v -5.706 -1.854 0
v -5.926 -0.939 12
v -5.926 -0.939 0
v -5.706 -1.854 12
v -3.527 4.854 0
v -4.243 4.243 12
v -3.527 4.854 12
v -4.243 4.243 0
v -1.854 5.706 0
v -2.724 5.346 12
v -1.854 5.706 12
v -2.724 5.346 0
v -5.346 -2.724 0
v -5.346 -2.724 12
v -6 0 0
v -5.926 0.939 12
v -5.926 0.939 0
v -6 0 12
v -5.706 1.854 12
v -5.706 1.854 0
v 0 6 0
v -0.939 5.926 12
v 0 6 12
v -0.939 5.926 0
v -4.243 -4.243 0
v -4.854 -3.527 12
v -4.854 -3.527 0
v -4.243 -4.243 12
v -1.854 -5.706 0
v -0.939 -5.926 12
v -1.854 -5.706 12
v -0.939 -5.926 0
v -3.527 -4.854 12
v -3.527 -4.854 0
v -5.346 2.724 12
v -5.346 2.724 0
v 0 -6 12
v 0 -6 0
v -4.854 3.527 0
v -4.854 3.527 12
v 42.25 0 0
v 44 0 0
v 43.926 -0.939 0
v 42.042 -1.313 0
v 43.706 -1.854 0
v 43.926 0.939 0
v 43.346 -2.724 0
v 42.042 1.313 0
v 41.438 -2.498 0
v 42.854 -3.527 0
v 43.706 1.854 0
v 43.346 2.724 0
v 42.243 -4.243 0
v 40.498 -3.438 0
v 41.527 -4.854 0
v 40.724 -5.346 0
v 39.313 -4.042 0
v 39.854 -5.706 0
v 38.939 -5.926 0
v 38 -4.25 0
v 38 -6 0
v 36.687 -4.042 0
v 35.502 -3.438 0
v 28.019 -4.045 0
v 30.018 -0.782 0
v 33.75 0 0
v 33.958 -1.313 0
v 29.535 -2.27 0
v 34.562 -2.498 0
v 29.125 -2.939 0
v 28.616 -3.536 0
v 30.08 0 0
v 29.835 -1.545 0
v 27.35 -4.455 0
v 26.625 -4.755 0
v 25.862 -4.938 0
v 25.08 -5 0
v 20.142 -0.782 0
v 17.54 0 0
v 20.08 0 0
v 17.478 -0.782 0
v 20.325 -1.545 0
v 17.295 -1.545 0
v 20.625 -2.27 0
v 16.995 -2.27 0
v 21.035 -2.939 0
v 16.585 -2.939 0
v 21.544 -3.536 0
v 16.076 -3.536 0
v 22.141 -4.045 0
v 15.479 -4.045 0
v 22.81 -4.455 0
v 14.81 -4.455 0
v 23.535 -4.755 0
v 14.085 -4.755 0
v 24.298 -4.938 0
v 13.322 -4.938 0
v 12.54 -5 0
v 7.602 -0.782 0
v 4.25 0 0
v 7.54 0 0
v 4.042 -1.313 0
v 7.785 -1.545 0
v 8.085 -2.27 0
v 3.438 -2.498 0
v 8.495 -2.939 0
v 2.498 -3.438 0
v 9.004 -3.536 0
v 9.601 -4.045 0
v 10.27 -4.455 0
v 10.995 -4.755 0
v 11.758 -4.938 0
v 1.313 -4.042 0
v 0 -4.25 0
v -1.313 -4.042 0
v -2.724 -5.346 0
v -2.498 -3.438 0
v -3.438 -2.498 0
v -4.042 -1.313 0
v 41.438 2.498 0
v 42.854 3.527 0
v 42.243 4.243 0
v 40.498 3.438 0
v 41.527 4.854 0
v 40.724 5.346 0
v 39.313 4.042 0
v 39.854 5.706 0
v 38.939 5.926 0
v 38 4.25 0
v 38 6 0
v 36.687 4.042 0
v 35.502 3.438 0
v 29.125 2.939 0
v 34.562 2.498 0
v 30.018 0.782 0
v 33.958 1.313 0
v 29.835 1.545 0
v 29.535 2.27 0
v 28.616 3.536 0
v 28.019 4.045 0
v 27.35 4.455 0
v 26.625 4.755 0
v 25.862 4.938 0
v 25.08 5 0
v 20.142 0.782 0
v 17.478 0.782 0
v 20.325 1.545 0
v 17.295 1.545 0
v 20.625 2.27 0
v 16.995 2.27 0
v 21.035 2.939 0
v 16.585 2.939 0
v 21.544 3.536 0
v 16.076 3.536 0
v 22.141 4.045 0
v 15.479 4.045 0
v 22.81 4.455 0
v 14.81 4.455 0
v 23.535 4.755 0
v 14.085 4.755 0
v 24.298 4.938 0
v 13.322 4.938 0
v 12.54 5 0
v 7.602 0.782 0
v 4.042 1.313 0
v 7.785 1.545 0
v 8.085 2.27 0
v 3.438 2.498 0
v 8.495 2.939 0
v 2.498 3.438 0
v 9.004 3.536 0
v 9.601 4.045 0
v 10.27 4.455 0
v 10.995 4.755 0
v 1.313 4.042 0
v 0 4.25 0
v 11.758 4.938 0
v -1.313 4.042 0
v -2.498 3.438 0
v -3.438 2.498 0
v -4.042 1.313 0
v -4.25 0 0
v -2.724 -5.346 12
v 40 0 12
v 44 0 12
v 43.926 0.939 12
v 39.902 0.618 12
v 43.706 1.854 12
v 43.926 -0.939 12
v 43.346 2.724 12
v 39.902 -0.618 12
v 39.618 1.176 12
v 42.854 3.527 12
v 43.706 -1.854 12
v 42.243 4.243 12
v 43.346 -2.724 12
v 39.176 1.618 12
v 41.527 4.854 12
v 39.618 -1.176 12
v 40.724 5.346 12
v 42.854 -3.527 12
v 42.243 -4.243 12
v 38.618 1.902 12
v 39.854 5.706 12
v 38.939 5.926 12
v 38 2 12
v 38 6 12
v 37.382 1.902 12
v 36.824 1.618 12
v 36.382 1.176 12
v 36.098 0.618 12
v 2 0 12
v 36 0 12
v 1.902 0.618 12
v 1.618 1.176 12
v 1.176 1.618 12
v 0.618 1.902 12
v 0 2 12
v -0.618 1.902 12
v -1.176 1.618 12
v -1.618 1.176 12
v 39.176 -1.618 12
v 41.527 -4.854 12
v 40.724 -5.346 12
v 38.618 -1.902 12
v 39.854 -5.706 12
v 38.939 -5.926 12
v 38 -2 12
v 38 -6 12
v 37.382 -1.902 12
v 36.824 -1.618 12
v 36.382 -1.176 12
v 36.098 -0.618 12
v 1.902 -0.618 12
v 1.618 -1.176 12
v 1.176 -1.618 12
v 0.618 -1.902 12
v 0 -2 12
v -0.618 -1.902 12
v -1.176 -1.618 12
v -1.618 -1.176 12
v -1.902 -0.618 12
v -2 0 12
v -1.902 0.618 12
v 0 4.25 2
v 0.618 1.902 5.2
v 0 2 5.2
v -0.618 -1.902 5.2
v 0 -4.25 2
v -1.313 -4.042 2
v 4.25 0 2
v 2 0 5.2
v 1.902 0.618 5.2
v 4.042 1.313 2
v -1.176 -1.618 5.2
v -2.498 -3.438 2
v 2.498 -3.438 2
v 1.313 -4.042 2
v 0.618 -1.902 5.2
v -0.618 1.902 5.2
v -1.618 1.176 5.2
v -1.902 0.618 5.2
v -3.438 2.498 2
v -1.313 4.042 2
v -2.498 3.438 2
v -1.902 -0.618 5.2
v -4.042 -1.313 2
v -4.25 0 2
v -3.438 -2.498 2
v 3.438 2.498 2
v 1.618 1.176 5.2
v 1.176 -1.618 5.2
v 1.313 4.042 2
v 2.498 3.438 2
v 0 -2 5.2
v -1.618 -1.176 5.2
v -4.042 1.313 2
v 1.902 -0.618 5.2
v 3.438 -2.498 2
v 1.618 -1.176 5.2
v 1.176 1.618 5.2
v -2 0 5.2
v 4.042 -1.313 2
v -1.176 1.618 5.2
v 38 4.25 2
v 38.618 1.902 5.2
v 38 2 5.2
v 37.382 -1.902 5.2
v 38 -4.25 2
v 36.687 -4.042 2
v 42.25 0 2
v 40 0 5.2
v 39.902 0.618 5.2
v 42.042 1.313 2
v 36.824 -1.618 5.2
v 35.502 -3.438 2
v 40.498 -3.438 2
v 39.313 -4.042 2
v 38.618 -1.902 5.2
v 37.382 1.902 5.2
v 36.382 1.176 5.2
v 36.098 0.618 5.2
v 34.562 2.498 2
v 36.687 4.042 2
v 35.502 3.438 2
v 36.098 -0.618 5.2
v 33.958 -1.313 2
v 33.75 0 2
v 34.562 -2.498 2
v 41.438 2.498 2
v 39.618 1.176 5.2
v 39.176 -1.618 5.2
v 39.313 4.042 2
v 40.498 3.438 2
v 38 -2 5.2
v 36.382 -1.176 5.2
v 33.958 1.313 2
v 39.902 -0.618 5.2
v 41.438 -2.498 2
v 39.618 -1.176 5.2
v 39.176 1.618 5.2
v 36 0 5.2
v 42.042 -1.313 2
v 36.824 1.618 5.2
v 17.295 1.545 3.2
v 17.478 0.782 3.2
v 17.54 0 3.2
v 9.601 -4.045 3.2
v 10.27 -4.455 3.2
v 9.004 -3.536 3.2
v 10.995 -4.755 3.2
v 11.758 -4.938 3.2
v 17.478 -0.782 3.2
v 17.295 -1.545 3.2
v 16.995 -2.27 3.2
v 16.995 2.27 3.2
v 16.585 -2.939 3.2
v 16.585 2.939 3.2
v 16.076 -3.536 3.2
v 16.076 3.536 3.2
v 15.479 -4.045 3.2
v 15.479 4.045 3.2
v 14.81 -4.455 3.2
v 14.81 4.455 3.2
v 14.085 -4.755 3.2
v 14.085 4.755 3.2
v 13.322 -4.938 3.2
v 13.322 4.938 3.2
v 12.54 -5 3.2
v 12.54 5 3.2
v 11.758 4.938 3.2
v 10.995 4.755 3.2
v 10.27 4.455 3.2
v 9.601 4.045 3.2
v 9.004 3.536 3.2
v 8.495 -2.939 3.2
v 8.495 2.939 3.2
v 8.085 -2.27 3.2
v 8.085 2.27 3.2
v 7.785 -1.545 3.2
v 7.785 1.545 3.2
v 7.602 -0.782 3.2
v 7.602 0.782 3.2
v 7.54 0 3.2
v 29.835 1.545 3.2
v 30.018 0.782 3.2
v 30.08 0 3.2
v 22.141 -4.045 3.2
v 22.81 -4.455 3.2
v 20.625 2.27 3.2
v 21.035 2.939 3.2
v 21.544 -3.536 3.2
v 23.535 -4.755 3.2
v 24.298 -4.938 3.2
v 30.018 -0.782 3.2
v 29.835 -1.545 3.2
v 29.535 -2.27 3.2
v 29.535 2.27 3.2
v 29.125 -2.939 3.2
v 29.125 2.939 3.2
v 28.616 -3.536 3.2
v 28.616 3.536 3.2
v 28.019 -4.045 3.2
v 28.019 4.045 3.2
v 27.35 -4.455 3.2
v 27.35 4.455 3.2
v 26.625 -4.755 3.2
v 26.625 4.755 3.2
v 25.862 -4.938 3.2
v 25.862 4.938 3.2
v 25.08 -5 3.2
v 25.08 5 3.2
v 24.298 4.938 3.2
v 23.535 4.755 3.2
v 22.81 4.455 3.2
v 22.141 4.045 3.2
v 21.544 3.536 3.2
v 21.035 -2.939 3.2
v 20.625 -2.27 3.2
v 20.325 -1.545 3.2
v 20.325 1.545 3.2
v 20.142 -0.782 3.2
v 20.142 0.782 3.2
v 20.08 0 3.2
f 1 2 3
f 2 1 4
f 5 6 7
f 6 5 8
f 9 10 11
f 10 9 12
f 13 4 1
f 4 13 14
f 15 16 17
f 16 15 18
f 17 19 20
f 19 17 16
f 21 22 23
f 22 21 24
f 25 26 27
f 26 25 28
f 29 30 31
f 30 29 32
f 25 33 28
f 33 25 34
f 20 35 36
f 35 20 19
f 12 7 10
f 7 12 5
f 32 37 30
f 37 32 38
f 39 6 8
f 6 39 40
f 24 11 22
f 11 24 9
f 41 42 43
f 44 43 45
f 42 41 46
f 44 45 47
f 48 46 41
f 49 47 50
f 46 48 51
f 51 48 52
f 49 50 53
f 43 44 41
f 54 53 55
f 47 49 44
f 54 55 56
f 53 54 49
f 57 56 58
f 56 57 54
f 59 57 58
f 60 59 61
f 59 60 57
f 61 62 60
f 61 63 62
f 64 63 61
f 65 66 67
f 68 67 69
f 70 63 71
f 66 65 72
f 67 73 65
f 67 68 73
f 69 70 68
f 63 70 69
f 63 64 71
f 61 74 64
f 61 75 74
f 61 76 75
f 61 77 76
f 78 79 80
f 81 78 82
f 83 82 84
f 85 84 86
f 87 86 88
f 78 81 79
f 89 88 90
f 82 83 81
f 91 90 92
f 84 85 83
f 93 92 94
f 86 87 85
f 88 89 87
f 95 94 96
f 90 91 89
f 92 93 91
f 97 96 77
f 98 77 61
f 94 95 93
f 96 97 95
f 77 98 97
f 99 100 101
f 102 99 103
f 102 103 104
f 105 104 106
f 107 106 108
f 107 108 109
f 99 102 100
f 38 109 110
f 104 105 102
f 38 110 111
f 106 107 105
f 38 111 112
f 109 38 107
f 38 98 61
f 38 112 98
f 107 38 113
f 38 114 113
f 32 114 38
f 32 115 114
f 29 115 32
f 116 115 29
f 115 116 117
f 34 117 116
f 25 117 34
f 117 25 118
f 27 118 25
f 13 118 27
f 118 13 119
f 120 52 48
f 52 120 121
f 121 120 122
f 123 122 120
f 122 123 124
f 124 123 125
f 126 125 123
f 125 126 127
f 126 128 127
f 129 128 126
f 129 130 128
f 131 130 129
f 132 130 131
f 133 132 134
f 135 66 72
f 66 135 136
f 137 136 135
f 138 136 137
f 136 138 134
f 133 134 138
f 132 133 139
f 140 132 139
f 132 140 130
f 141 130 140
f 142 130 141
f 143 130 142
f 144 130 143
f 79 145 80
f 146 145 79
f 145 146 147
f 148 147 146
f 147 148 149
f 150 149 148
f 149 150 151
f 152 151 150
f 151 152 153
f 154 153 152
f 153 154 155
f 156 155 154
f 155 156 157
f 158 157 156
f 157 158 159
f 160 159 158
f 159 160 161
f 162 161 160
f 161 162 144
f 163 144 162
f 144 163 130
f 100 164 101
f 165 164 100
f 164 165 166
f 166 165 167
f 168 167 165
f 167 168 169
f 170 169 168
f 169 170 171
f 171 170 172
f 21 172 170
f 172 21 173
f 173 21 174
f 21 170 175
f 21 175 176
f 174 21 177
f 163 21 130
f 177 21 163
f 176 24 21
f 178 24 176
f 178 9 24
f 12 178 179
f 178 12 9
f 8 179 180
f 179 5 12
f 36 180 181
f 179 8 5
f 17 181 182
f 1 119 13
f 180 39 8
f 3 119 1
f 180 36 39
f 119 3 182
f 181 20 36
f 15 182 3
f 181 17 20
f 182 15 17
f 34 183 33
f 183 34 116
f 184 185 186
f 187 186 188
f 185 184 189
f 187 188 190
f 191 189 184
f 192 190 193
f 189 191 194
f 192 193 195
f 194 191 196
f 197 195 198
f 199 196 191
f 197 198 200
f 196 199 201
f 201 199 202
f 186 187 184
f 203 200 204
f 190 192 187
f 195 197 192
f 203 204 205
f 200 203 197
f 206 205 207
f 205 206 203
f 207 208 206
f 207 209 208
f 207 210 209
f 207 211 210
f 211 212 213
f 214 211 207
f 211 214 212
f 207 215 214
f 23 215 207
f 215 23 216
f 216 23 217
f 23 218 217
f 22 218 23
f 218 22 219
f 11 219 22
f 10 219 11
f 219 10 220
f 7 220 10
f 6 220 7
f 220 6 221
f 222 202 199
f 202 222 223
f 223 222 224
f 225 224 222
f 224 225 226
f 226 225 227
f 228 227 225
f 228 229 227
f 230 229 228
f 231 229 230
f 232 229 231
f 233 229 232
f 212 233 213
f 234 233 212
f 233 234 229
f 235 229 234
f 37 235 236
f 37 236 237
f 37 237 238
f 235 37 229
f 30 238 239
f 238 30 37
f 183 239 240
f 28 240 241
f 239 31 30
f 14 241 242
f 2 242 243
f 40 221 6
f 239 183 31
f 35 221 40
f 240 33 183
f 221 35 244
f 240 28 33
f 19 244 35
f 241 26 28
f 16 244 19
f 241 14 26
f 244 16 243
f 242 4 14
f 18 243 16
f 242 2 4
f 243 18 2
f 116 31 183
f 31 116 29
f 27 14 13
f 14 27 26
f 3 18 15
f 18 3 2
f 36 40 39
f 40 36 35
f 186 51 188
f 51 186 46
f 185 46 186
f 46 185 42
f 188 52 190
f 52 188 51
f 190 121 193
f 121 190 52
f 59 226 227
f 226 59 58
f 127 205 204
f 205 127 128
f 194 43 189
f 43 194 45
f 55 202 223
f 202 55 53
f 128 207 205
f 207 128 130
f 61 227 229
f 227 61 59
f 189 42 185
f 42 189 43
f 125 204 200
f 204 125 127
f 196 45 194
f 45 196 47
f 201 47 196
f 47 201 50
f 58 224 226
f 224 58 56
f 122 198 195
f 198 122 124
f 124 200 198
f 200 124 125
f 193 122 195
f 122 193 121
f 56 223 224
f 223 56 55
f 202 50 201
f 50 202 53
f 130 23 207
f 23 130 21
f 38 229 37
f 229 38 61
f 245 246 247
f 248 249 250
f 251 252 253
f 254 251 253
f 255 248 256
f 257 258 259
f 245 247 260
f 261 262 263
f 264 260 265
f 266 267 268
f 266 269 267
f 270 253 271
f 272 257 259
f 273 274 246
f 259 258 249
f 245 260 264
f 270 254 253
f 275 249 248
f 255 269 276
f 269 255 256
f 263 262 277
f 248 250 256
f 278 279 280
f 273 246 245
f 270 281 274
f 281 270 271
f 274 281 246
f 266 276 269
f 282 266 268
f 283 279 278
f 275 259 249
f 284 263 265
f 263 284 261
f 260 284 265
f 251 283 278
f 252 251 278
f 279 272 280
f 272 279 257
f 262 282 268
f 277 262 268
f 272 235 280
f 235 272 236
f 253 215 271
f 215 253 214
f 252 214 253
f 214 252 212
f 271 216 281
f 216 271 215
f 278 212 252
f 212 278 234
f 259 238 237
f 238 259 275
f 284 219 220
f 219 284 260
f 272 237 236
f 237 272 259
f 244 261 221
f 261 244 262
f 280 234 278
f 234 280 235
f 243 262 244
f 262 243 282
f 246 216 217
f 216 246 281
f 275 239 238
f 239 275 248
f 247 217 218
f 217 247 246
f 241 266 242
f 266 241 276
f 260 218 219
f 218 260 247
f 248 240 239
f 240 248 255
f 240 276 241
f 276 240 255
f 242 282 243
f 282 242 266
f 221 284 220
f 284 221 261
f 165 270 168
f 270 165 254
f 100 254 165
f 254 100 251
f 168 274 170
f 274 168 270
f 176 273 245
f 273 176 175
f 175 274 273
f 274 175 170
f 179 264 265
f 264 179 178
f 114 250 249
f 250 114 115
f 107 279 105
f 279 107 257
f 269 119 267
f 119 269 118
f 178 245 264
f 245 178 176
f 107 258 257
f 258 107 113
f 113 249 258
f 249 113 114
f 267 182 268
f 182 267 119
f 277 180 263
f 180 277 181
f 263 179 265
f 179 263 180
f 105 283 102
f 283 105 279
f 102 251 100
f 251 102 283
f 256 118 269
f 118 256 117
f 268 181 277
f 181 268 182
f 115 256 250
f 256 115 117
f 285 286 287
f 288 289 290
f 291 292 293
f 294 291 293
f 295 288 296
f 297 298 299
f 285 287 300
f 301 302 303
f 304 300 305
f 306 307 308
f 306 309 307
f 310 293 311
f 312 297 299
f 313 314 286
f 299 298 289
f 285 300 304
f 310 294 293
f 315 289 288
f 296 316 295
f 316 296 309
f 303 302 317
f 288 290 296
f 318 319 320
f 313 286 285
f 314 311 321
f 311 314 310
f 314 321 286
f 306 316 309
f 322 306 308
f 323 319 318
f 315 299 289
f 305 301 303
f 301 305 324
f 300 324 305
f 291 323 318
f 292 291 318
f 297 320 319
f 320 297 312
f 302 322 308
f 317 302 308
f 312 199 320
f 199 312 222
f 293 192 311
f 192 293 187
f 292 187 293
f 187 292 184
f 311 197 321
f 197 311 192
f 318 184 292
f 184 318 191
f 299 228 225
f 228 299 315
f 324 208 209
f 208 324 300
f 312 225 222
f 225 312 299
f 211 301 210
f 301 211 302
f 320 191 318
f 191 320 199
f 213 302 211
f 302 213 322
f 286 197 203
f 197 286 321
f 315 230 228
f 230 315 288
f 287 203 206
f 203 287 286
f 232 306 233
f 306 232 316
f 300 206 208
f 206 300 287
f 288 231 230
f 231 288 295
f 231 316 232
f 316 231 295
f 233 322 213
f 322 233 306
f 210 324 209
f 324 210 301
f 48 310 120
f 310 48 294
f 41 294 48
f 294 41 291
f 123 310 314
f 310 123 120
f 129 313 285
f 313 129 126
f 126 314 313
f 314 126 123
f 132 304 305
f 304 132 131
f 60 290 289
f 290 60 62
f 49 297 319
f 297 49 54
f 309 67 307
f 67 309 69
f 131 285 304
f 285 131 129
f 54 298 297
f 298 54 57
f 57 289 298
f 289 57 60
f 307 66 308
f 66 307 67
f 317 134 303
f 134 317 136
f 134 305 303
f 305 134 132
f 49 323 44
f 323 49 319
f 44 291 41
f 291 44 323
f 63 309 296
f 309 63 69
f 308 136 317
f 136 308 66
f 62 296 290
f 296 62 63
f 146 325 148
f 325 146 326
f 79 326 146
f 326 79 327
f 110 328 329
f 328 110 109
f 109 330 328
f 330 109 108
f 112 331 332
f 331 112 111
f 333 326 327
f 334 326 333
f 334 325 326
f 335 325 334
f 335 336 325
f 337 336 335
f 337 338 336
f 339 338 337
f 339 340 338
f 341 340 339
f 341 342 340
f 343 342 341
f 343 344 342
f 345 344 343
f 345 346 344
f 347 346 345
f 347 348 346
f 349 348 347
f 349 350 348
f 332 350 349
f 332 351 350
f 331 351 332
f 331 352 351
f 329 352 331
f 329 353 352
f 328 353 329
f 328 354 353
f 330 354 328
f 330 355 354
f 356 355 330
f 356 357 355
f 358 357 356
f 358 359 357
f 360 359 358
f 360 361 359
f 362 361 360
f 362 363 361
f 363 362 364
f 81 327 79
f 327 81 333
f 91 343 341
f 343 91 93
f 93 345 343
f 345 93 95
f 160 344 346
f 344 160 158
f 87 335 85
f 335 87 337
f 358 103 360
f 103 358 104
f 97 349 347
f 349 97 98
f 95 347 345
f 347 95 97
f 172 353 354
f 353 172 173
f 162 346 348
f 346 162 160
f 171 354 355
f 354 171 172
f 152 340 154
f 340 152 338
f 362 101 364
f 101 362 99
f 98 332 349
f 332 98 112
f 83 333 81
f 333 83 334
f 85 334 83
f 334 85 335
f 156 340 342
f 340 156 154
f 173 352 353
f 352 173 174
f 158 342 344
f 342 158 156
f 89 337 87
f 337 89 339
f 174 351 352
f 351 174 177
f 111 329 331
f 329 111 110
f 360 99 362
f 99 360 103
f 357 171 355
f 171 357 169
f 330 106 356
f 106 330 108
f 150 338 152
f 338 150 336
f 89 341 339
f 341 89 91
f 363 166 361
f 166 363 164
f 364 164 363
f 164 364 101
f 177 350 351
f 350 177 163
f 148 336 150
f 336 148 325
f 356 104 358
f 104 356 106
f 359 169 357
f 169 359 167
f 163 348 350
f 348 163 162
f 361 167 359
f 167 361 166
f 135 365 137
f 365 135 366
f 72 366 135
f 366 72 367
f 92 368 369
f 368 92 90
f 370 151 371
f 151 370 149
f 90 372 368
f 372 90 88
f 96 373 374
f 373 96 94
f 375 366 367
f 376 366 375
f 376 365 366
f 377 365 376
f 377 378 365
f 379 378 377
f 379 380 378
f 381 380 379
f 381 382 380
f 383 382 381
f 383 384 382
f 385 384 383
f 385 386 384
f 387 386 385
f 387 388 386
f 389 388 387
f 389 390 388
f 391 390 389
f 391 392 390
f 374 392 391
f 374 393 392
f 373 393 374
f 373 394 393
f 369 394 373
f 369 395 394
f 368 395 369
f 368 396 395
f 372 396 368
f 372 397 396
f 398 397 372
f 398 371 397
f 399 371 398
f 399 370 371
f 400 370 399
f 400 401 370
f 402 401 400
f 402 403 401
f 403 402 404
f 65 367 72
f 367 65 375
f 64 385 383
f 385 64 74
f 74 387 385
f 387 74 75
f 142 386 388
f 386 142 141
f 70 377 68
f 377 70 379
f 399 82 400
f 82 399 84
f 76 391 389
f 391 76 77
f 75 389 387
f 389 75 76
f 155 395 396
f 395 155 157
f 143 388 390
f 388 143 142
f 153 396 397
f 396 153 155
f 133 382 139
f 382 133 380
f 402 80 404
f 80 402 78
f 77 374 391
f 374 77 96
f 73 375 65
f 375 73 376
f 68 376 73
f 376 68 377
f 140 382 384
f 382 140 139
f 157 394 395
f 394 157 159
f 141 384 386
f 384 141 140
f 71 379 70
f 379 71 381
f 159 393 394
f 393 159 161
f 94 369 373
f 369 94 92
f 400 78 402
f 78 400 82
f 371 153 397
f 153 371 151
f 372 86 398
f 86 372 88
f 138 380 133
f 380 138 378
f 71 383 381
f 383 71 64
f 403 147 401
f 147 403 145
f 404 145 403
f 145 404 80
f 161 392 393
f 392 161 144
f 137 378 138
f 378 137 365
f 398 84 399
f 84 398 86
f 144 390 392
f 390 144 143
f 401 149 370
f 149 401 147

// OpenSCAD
magnets=2;

magnet_d = 10;
magnet_h = 3.2;

height = 12;
width = magnet_d + 2;
length = (magnet_d * (magnets+3));

$fn = 40;

module base() {
    cylinder(h=height, d=width);
    translate([length - width, 0, 0])
      cylinder(h=height, d=width);
    translate([0, -0.5*width, 0])
      cube([length-width, width, height]);
}

module screw_countersunk(
        l=20,   //length
        dh = 8.5,   //head dia
        lh = 3.2,   //head length
        ds = 4,  //shaft dia
        rec = 2,
        $fn=20,
        )
{
    union() {
        translate([0, 0, rec]) {
        cylinder(h=lh, r1=dh/2, r2=ds/2);
        cylinder(h=l, d=ds);
        }
        cylinder(h=rec, d=dh);
    }
}

module magnet() {
  cylinder(h=magnet_h, d=magnet_d);
}
difference() {
  base();
  //translate([0.5*(length-width), 0, 0]) magnet();
  translate([0.33*(length-width), 0, 0]) magnet();
  translate([0.66*(length-width), 0, 0]) magnet();
  screw_countersunk();
  translate([length - width, 0, 0]) screw_countersunk();
}
